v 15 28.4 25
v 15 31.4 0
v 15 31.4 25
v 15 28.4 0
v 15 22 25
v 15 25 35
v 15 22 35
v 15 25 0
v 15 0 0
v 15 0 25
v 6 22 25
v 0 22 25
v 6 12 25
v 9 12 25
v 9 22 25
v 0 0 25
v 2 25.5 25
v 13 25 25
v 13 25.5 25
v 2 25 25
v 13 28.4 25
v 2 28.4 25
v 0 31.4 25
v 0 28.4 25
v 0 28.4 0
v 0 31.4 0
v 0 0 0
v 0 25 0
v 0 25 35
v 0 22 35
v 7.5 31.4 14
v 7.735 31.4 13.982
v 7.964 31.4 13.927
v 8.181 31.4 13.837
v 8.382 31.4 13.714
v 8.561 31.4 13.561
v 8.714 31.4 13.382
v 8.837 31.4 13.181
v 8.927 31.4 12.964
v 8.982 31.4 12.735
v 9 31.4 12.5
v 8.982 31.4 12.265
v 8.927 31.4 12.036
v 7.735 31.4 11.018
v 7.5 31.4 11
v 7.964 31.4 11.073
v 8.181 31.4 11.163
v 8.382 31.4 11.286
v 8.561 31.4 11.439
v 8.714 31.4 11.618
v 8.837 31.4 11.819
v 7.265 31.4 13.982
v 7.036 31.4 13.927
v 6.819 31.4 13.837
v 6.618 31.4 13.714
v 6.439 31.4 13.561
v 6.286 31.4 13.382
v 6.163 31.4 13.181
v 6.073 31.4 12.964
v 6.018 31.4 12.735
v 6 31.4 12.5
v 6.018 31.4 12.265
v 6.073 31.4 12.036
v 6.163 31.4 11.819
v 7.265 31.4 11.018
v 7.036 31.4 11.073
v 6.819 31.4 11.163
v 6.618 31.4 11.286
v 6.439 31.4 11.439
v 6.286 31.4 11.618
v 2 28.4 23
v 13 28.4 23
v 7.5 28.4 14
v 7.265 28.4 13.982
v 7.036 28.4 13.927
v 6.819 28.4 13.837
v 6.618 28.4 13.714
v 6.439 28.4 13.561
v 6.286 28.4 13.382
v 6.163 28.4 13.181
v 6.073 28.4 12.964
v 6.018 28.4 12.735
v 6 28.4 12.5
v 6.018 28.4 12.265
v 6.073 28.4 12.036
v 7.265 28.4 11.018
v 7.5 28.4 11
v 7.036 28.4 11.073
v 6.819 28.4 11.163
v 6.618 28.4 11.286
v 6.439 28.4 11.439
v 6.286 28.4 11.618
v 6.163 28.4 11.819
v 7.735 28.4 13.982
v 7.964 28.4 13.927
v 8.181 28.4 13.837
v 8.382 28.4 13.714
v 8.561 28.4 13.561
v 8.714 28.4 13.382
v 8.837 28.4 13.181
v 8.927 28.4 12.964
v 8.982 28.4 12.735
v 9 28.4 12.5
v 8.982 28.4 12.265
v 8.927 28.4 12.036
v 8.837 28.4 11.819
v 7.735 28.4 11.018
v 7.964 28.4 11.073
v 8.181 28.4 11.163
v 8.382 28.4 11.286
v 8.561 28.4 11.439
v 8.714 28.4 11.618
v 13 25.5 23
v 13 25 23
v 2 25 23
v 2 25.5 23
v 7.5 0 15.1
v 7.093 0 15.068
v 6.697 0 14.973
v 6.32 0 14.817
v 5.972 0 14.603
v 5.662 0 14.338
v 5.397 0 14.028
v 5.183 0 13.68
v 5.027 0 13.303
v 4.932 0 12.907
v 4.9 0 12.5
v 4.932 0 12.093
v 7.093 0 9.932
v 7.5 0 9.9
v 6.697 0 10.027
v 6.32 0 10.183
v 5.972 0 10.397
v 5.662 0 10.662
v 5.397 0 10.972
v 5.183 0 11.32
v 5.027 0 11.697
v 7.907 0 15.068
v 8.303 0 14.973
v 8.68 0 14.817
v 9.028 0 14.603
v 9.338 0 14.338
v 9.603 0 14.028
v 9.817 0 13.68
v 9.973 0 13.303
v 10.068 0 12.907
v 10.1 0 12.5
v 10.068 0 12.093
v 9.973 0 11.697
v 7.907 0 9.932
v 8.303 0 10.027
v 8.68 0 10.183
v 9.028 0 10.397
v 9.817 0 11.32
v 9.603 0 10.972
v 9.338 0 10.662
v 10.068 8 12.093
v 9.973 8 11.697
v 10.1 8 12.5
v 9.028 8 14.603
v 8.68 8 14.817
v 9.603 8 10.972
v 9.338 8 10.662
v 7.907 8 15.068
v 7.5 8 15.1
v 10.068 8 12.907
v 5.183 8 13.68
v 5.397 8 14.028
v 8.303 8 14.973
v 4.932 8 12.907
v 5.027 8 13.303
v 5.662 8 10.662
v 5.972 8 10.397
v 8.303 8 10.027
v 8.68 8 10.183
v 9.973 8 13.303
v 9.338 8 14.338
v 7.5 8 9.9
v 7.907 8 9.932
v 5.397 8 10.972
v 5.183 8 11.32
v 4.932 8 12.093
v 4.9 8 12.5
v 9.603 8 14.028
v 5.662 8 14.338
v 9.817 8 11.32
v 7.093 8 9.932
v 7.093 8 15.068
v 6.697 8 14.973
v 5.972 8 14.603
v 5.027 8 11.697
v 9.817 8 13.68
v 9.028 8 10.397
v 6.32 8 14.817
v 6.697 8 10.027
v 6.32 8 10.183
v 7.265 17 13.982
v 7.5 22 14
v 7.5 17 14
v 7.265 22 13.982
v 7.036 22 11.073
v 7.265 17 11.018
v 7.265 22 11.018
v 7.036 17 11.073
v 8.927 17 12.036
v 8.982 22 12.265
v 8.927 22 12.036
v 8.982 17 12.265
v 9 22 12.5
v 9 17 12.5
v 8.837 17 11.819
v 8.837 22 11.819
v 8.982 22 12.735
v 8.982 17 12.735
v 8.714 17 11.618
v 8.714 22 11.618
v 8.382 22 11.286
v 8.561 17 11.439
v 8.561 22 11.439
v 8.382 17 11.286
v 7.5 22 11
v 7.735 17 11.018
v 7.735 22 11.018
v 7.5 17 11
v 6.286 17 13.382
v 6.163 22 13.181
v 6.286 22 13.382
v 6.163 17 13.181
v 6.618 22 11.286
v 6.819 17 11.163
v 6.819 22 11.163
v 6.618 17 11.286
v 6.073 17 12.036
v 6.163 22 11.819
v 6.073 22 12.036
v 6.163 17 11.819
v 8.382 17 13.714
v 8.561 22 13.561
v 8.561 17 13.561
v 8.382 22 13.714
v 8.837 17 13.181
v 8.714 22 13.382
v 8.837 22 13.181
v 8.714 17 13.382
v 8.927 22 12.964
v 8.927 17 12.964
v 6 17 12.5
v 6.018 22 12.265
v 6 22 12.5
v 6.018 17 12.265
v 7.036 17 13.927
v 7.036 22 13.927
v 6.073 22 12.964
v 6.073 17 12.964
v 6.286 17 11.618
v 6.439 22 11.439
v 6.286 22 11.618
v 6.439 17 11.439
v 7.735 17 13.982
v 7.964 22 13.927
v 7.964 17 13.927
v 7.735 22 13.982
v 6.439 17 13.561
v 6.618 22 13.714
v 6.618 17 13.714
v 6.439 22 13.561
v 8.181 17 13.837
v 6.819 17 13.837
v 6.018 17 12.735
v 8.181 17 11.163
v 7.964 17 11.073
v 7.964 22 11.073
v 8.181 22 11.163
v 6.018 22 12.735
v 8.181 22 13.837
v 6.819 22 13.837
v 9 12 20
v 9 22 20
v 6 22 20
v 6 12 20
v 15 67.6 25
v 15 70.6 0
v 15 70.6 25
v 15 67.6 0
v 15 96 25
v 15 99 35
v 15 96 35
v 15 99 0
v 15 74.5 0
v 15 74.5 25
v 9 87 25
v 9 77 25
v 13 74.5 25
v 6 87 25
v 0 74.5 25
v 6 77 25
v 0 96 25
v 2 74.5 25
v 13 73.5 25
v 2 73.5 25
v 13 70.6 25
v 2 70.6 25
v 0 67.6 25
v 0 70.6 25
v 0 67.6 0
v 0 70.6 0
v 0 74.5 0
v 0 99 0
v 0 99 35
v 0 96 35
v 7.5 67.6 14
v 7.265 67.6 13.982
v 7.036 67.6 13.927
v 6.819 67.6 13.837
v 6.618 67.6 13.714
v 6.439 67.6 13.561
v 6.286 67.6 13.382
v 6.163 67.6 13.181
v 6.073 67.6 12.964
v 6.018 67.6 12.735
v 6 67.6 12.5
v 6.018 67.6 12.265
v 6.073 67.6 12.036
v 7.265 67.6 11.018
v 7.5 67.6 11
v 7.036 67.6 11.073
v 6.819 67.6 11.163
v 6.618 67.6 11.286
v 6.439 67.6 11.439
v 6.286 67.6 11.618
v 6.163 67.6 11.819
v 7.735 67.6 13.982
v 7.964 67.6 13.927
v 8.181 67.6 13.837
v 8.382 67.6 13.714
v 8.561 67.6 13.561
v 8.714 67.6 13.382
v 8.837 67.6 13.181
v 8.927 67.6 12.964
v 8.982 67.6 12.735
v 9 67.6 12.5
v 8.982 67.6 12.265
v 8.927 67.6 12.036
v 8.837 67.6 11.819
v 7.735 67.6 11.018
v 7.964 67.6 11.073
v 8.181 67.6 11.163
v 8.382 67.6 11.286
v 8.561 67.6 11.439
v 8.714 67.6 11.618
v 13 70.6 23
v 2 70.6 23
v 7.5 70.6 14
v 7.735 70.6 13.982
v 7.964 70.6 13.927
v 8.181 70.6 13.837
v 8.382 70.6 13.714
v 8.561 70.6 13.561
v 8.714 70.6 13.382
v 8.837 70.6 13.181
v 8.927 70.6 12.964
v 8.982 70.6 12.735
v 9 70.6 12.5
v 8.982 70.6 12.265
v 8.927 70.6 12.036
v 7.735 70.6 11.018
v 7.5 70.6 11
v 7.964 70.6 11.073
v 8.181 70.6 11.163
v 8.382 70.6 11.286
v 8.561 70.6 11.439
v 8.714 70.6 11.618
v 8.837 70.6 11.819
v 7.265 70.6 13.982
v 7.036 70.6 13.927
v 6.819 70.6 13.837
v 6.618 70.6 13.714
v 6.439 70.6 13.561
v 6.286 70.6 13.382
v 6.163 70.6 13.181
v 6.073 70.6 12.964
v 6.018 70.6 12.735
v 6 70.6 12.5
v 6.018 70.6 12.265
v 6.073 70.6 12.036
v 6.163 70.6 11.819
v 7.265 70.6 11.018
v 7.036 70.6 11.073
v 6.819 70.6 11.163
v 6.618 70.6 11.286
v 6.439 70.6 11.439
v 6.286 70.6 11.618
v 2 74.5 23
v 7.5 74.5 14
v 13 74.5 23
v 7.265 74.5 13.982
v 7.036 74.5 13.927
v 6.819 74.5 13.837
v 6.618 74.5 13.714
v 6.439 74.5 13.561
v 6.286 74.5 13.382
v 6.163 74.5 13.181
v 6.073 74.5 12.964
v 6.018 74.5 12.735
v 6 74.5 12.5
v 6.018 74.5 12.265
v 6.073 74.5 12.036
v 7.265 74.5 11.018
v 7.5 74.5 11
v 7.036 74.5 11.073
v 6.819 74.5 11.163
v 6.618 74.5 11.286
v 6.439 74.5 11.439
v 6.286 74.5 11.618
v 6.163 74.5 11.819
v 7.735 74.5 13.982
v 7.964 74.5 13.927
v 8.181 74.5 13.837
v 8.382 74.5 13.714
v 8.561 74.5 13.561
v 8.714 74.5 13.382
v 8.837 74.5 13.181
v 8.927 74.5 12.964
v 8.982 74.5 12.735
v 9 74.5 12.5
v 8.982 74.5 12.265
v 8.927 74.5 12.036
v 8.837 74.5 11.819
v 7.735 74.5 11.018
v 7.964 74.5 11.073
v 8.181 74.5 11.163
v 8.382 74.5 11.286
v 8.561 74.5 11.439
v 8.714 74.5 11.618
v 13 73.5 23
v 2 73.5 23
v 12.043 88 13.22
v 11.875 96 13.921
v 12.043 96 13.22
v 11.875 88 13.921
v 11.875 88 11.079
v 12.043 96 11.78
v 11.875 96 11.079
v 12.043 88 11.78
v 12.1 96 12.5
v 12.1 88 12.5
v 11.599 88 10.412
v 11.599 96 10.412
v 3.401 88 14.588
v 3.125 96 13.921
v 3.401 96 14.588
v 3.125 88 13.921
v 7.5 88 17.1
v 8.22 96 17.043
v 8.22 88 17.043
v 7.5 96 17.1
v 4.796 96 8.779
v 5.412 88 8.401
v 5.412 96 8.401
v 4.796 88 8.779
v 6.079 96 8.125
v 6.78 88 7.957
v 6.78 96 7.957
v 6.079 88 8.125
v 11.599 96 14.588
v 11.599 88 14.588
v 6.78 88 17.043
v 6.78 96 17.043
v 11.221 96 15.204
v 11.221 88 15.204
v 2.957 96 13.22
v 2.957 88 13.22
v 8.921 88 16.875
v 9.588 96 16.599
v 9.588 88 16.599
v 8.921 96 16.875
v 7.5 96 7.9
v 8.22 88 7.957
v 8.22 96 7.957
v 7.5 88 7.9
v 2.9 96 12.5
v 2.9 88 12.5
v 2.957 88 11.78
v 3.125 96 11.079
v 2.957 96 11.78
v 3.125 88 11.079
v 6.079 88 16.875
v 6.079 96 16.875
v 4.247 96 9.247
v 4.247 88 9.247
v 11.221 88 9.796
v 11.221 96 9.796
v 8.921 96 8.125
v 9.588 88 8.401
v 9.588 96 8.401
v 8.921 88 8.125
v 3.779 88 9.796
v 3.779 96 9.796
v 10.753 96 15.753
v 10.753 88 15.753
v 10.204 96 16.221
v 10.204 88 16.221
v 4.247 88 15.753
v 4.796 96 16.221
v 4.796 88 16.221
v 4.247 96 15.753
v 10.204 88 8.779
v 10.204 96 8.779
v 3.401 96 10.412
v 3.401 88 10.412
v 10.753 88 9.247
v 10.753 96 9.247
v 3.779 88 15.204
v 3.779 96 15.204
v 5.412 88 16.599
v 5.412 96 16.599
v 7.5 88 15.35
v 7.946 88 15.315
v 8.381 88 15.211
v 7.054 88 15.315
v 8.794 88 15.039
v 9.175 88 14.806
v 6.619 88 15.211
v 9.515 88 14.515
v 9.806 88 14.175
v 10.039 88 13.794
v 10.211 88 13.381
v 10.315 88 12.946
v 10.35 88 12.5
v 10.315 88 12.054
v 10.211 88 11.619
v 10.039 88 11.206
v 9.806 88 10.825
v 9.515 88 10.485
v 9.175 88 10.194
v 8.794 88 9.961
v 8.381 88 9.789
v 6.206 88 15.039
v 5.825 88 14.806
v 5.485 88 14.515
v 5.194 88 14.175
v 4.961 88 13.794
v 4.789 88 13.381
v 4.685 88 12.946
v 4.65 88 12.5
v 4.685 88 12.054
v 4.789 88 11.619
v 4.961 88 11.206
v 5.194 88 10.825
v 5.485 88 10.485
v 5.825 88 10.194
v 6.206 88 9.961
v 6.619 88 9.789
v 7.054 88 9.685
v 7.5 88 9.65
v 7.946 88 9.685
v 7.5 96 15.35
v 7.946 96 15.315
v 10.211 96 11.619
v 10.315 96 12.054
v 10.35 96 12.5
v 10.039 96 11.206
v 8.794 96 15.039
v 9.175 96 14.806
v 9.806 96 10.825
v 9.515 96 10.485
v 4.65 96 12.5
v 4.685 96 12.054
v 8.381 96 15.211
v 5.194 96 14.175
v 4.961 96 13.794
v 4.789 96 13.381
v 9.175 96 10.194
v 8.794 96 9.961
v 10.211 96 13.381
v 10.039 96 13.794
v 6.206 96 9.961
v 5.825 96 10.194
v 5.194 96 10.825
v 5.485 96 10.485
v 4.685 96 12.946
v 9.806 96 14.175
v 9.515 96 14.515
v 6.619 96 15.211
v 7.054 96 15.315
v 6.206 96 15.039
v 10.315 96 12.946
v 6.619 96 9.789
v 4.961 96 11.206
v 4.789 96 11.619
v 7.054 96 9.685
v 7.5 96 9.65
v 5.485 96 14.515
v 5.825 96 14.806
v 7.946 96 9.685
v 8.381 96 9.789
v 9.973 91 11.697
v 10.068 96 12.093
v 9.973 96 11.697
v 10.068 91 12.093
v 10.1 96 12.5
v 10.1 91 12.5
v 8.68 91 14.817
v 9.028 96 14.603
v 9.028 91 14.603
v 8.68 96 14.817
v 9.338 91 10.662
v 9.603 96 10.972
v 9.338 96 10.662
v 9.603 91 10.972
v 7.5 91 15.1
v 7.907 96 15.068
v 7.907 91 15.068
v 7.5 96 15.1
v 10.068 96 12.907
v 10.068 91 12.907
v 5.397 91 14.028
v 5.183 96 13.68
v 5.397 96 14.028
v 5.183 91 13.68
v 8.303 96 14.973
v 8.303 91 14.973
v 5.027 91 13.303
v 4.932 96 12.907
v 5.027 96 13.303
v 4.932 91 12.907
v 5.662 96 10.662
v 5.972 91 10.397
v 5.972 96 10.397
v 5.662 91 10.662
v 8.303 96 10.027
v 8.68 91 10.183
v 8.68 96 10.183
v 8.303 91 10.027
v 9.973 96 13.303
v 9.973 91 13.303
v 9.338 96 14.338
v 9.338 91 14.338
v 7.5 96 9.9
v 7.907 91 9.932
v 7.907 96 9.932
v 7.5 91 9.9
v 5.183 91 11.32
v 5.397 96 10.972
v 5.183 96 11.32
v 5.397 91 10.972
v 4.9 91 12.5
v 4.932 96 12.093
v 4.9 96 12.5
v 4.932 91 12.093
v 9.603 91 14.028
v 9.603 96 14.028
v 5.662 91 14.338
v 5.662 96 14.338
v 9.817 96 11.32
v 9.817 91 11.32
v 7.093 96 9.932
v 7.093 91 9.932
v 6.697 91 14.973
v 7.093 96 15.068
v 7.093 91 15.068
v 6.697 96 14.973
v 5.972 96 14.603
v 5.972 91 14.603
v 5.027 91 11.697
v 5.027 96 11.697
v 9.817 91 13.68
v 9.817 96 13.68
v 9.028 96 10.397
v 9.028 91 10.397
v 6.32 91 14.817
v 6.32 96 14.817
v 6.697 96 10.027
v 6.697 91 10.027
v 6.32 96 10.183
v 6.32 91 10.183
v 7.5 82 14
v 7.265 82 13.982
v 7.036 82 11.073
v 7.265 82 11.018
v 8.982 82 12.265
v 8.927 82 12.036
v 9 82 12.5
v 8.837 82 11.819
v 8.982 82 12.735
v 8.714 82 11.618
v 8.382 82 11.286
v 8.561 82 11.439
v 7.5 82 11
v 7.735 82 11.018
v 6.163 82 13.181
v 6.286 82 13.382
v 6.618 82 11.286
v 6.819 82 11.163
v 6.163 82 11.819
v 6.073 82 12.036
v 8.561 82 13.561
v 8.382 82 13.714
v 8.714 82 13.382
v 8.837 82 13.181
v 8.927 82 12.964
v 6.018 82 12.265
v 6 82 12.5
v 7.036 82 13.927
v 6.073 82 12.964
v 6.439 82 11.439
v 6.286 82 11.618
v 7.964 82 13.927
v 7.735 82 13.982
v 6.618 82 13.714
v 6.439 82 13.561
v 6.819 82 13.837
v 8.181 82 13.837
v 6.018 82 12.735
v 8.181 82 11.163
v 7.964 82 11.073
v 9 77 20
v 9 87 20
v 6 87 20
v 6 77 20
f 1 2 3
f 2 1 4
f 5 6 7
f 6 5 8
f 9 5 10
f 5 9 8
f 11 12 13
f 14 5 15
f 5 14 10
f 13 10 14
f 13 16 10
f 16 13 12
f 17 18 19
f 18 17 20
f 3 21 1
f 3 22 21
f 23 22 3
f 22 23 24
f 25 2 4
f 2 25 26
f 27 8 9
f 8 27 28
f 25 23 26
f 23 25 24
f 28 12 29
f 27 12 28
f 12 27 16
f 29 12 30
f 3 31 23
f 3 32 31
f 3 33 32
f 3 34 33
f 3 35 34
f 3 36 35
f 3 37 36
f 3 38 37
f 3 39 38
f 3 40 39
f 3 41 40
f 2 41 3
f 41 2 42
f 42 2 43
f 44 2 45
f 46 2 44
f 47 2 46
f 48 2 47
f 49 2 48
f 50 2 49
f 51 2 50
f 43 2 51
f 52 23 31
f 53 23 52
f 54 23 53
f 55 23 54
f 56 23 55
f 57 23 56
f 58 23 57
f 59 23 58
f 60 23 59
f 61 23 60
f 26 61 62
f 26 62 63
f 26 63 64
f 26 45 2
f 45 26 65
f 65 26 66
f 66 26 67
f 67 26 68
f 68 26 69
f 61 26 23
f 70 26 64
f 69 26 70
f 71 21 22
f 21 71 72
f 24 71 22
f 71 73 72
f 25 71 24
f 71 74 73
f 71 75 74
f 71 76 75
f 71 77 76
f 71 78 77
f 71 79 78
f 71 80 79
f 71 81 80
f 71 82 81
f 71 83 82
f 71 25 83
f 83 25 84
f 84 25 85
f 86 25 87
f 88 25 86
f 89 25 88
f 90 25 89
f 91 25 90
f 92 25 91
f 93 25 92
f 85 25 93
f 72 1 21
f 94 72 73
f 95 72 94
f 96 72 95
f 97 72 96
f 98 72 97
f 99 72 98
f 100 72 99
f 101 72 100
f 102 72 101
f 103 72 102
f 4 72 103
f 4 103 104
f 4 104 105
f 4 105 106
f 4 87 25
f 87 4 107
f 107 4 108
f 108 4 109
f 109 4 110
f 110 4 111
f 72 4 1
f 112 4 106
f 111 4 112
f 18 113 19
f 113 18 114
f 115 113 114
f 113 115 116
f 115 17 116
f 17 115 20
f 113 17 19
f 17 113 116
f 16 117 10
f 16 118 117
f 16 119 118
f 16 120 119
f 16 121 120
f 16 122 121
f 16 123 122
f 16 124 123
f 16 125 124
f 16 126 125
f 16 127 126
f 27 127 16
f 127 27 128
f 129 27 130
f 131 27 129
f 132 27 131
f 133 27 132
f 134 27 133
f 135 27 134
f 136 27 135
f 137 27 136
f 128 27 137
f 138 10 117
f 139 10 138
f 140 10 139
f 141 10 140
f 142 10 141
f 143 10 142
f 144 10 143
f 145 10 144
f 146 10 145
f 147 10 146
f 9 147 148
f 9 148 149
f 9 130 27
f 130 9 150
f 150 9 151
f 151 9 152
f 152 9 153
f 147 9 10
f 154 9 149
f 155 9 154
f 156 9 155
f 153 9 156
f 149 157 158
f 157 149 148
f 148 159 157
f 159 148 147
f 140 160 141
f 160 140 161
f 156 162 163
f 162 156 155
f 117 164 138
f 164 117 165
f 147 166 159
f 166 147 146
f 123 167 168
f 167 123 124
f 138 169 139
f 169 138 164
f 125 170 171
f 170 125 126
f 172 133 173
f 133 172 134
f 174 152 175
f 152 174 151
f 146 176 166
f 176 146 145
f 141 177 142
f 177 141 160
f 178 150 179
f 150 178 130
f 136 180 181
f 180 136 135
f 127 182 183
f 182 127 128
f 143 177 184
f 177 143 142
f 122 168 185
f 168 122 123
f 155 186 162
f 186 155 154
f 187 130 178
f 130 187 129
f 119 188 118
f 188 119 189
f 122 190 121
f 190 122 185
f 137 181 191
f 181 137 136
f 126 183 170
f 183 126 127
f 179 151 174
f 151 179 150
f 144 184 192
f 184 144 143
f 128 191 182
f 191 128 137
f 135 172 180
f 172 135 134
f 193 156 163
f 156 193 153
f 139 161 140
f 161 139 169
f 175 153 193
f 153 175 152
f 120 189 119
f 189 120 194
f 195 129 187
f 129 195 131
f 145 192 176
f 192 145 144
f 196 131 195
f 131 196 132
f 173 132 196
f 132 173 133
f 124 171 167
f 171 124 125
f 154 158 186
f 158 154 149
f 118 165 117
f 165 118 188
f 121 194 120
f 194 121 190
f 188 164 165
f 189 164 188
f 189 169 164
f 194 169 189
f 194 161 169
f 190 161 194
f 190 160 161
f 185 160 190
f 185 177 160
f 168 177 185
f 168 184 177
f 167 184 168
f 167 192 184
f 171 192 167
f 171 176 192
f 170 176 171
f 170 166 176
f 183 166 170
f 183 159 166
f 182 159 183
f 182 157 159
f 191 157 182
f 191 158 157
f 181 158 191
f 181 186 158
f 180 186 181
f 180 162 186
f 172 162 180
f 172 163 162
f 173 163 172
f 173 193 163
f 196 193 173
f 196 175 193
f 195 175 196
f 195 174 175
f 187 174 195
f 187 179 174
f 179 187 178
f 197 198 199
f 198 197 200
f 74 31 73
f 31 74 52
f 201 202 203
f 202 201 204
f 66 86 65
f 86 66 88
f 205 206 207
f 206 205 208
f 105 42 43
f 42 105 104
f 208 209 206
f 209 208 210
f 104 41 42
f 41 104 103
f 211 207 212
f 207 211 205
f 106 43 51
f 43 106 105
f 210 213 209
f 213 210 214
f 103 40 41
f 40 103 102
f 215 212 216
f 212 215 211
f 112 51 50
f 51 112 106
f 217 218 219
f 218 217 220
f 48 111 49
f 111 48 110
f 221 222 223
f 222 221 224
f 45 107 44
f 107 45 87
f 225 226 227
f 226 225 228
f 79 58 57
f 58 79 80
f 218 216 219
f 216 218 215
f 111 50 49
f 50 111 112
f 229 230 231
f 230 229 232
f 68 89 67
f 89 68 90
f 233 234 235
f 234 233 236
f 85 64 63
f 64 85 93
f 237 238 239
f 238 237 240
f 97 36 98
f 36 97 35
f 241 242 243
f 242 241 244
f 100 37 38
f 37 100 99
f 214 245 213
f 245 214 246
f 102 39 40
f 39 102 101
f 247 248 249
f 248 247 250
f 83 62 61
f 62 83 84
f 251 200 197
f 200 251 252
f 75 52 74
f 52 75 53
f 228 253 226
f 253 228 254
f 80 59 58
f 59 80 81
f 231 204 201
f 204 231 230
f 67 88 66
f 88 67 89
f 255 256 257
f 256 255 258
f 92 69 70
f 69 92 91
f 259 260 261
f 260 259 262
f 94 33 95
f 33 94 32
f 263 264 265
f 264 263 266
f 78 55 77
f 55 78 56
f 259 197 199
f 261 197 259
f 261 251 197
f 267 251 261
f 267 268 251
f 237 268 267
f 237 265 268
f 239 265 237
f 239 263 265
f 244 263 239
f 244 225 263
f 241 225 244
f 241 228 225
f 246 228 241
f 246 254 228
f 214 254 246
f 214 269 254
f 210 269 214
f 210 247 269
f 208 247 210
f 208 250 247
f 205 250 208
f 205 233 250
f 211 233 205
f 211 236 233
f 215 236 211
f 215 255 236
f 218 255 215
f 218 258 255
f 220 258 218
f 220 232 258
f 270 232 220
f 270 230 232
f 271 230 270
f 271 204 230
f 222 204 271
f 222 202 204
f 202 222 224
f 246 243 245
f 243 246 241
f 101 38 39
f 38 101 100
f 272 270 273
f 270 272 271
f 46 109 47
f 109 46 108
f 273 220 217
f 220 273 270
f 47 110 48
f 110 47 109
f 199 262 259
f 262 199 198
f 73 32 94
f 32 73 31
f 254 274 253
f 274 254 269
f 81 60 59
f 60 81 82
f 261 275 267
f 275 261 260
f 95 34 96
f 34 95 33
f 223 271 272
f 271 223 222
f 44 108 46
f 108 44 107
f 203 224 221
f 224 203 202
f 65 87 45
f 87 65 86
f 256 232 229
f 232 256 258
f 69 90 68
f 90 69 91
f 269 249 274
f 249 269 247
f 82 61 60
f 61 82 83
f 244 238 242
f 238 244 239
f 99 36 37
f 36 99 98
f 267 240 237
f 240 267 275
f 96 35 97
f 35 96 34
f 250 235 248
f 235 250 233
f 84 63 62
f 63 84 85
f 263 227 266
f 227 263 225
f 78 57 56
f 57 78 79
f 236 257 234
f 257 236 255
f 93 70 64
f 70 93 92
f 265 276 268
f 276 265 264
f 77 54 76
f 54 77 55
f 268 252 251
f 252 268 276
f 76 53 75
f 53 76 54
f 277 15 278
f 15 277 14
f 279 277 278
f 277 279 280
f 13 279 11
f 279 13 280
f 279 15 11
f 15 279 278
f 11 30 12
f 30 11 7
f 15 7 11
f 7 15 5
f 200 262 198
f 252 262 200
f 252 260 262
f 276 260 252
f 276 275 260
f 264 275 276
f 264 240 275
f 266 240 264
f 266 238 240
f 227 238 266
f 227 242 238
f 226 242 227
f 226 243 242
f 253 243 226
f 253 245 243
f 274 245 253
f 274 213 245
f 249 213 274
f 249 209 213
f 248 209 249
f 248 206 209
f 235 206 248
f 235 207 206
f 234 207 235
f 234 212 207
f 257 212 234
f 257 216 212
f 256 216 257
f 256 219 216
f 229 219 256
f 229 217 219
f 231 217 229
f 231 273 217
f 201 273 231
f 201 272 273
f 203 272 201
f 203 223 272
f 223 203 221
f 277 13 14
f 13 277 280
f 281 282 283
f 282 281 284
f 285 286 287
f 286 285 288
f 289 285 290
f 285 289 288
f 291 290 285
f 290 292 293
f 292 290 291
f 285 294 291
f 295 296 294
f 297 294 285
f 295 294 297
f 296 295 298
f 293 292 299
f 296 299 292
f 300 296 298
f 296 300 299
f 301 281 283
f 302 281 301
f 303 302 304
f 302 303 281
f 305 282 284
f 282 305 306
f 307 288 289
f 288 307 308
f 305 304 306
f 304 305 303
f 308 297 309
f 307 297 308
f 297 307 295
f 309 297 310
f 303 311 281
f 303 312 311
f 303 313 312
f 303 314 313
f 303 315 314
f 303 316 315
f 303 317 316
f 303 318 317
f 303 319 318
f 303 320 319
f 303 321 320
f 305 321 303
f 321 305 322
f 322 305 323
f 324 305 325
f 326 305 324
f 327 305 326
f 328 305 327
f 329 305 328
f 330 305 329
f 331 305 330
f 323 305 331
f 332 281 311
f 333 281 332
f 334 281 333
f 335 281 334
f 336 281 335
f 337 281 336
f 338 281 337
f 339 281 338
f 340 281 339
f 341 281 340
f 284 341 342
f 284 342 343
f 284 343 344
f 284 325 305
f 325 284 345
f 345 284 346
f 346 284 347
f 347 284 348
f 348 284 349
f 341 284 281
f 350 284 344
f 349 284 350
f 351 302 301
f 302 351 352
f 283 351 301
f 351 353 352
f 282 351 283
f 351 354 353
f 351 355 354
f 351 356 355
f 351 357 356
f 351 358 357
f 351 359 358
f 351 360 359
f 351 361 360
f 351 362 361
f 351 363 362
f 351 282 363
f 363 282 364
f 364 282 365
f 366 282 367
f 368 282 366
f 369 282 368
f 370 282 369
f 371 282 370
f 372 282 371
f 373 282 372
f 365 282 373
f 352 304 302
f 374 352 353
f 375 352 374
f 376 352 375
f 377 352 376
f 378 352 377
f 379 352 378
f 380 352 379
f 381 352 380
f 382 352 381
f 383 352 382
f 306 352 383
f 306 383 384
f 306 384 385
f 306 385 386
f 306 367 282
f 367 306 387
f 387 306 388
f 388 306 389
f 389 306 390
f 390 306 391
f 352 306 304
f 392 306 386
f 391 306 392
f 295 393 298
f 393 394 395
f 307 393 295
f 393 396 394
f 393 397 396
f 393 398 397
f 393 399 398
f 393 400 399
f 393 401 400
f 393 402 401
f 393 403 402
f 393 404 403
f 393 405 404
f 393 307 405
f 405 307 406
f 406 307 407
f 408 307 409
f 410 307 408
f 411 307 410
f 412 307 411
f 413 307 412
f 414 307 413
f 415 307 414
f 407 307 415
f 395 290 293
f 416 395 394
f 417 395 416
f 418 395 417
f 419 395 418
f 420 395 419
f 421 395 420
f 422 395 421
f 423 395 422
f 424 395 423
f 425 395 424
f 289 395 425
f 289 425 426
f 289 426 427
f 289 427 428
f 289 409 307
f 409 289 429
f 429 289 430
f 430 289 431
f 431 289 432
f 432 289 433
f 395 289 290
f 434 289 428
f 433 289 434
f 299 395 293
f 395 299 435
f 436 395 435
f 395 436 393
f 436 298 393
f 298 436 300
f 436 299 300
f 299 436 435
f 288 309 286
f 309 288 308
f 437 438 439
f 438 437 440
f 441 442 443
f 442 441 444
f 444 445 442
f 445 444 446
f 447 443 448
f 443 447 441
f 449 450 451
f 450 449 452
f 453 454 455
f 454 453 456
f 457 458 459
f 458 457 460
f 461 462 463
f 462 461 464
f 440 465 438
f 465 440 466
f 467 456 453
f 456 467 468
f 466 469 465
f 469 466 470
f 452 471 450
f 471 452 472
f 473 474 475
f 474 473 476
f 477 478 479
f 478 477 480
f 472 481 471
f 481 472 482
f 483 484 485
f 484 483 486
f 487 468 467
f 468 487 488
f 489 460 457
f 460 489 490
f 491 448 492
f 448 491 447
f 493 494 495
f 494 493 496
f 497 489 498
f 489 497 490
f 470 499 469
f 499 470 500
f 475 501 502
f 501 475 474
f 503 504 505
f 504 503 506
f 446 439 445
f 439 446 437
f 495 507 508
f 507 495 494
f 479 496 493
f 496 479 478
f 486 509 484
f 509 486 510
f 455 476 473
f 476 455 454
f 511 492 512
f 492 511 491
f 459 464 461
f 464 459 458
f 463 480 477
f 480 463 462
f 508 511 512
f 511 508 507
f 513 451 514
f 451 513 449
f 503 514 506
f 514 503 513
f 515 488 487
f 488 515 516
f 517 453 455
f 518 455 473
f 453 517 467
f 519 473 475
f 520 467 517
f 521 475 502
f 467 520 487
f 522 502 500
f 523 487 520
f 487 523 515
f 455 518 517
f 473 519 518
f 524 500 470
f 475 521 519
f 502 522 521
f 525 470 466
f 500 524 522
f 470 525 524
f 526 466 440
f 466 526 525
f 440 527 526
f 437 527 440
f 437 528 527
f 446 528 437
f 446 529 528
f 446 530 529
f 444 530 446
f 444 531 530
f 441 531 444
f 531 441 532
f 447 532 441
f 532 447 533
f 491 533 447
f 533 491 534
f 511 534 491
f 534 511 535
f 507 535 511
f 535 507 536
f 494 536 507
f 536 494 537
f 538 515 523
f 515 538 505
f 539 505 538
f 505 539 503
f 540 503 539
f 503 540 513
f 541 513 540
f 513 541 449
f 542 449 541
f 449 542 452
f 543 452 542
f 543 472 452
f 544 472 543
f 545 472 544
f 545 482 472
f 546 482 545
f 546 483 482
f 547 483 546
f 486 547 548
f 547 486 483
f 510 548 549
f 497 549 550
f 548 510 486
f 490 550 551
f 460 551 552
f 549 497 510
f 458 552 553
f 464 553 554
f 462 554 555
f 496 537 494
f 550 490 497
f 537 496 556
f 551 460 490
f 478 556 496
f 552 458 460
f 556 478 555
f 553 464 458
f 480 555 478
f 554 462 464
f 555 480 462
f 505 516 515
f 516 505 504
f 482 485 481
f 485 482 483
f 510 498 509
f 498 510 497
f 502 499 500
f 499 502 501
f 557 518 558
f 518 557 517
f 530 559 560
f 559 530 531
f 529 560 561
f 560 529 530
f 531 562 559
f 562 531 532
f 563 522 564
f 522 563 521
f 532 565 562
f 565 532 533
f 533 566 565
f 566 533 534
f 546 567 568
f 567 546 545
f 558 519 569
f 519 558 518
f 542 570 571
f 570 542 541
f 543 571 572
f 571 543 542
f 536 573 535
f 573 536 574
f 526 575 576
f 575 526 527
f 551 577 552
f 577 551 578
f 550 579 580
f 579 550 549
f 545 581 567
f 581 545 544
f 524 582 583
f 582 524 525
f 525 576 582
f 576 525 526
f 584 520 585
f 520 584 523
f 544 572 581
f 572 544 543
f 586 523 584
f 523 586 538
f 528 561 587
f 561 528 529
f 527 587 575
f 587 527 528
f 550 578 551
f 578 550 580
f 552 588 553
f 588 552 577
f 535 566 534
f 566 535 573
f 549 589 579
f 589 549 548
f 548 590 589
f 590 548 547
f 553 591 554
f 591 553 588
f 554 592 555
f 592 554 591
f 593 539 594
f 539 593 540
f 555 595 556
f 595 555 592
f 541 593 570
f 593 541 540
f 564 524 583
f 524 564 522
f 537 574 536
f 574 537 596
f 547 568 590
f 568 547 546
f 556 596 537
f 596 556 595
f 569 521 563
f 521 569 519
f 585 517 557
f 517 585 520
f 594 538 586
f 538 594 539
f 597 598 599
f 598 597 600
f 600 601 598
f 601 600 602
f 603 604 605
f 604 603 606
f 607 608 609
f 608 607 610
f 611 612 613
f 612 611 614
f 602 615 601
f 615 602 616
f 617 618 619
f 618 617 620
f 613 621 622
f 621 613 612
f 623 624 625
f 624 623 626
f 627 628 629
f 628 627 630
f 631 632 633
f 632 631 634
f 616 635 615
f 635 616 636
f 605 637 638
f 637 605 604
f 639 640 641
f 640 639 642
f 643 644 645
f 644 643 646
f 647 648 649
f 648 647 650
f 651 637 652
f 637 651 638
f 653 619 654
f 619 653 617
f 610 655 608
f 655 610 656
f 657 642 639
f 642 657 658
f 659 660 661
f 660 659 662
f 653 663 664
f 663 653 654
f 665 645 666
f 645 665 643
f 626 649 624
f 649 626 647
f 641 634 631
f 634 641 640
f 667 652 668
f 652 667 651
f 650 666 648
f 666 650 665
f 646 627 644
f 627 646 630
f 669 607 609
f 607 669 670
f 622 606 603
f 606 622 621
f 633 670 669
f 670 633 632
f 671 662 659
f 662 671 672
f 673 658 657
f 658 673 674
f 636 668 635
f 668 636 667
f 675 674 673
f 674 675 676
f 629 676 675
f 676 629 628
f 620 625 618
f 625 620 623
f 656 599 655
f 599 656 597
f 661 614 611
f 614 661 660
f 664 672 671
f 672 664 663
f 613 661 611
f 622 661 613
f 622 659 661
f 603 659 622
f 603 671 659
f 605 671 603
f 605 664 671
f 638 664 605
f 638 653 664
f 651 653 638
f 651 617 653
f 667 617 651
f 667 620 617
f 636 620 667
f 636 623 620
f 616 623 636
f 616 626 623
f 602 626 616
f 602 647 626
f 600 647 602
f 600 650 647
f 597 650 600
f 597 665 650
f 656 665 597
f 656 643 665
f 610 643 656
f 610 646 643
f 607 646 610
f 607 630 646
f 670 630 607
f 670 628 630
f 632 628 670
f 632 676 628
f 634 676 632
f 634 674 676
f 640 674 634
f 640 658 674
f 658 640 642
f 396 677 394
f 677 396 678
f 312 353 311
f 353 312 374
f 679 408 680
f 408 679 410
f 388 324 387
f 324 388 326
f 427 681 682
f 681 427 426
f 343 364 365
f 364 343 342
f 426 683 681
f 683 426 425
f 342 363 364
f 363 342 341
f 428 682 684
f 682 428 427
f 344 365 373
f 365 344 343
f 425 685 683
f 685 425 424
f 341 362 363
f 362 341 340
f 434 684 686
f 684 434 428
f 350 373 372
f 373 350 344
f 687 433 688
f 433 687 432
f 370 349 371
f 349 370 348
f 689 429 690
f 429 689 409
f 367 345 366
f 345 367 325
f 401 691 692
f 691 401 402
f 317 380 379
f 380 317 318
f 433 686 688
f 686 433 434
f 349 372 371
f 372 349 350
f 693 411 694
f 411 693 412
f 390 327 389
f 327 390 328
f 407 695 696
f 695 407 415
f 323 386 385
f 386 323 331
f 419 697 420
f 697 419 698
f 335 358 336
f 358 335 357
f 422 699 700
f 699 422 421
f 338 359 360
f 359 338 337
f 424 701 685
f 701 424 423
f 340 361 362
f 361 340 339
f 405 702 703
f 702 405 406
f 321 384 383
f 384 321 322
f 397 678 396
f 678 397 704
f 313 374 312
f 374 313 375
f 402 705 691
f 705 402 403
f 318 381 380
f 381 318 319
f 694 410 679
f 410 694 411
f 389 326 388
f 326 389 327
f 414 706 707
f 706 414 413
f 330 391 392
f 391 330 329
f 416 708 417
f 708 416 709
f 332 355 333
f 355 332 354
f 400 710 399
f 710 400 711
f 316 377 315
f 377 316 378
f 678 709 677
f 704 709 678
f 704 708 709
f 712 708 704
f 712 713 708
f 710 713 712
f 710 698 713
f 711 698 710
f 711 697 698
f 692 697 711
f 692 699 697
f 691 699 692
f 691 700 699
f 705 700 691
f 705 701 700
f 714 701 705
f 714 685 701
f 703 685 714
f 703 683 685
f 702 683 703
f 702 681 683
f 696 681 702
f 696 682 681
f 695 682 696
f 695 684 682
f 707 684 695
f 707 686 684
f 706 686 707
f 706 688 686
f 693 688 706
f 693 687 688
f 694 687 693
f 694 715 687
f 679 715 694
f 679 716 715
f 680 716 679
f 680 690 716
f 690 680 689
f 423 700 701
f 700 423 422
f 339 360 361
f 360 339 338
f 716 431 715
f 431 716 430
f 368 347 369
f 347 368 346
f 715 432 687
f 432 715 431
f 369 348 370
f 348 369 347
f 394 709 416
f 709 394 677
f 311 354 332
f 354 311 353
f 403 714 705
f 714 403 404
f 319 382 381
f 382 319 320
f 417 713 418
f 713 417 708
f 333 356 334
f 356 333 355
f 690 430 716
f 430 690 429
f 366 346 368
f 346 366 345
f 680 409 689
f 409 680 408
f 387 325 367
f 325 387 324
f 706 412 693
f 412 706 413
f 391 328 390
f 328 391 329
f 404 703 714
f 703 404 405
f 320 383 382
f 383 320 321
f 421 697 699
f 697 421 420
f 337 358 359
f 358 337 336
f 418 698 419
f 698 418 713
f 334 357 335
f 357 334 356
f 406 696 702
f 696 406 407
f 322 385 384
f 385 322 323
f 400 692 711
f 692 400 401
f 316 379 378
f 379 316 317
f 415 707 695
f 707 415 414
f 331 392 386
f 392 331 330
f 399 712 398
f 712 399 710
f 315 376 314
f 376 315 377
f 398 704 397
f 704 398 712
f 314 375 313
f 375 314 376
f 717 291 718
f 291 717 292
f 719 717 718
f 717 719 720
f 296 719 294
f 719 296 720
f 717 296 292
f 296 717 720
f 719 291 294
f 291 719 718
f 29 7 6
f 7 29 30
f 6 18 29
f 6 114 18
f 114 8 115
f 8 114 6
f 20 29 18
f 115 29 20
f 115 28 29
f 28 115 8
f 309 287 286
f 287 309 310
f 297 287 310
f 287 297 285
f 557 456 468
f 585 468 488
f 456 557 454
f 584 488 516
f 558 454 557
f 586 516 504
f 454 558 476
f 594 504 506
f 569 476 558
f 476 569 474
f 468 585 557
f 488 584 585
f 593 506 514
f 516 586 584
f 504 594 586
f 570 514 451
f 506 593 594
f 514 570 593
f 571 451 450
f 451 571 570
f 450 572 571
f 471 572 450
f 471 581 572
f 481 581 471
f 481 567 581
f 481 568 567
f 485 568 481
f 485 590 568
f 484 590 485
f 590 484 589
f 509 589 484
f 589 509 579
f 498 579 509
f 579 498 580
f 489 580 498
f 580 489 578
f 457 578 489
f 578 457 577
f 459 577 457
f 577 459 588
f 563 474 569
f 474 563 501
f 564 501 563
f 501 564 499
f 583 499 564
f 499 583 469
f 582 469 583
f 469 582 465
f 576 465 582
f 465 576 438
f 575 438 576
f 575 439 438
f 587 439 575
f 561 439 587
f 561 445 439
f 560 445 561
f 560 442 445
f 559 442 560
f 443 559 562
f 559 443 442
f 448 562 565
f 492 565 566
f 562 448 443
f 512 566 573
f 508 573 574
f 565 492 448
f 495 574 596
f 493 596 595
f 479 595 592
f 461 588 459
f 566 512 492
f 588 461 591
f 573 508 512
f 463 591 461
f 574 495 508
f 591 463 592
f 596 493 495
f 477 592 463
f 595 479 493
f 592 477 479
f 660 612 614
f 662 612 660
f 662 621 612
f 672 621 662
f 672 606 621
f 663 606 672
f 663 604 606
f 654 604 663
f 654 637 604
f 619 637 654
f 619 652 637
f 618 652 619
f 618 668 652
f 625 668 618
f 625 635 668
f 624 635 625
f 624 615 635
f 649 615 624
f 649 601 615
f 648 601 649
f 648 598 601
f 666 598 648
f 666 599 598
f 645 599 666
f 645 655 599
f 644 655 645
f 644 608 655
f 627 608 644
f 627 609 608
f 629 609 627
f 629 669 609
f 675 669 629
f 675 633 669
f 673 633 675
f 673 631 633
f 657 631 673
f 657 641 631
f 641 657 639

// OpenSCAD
// file: common.scad
// ============================================================
// FBA Prep Machine - Common Parameters
// All dimensions in millimeters
// ============================================================

// --- Texjoy Bottle Dimensions (16oz) ---
BOTTLE_WIDTH   = 65;    // X dimension (front-to-back)
BOTTLE_DEPTH   = 65;    // Y dimension (side-to-side)
BOTTLE_HEIGHT  = 170;   // Z dimension (cap to base)
BOTTLE_CLEARANCE = 3;   // Extra gap per side for easy sliding

// Derived chute dimensions
CHUTE_WIDTH    = BOTTLE_WIDTH + BOTTLE_CLEARANCE * 2;   // 71mm
CHUTE_DEPTH    = BOTTLE_DEPTH + BOTTLE_CLEARANCE * 2;   // 71mm
CHUTE_WALL     = 3;     // Wall thickness
CHUTE_HEIGHT   = 50;    // Wall height (doesn't need to be full bottle height)

// --- Hardware Dimensions ---
// NEMA 17 Stepper Motor
NEMA17_SIZE     = 42.3;
NEMA17_HOLE_SPACING = 31;
NEMA17_SHAFT_DIA    = 5;
NEMA17_BOSS_DIA     = 22;
NEMA17_SCREW_DIA    = 3.2;  // M3 clearance

// A4988 Stepper Driver
A4988_WIDTH  = 20.5;
A4988_LENGTH = 15.5;

// ESP32 DevKit V1
ESP32_WIDTH  = 28;
ESP32_LENGTH = 52;
ESP32_HEIGHT = 8;

// GM65 Barcode Scanner Module
GM65_WIDTH   = 20.5;
GM65_LENGTH  = 34;
GM65_HEIGHT  = 18;

// IR LED / Photodiode (5mm)
IR_LED_DIA   = 5.2;

// Servo (SG90/MG90S)
SERVO_WIDTH  = 12.5;
SERVO_LENGTH = 23;
SERVO_HEIGHT = 22;
SERVO_TAB_WIDTH = 32.5;
SERVO_SCREW_SPACING = 28;

// Nichrome Wire
NICHROME_DIA = 1.0;

// --- Fastener Dimensions ---
M3_DIA       = 3.2;
M3_HEAD_DIA  = 5.8;
M3_NUT_W     = 5.5;
M3_NUT_H     = 2.4;

M4_DIA       = 4.2;
M4_HEAD_DIA  = 7.2;

// --- Snap-Fit Parameters ---
SNAP_WIDTH     = 8;
SNAP_HEIGHT    = 4;
SNAP_DEPTH     = 2;
SNAP_TOLERANCE = 0.3;

// --- Print Settings ---
LAYER_HEIGHT  = 0.2;
NOZZLE_DIA    = 0.4;
$fn = 40;  // Circle resolution

// --- Helper Modules ---

// Rounded rectangle
module rounded_rect(w, d, h, r=2) {
    hull() {
        for (x = [r, w-r])
            for (y = [r, d-r])
                translate([x, y, 0])
                    cylinder(h=h, r=r);
    }
}

// M3 screw hole (through)
module m3_hole(h=10) {
    cylinder(d=M3_DIA, h=h);
}

// M3 counterbore
module m3_counterbore(h=10, cb_depth=3) {
    cylinder(d=M3_DIA, h=h);
    cylinder(d=M3_HEAD_DIA, h=cb_depth);
}

// M3 nut trap (hexagonal)
module m3_nut_trap(h=M3_NUT_H) {
    cylinder(d=M3_NUT_W / cos(30), h=h, $fn=6);
}

// Snap-fit tab (male)
module snap_tab() {
    // Tapered tab for snap-fit connection
    hull() {
        cube([SNAP_WIDTH, SNAP_DEPTH * 0.5, SNAP_HEIGHT]);
        translate([0, SNAP_DEPTH, SNAP_HEIGHT * 0.3])
            cube([SNAP_WIDTH, 0.1, SNAP_HEIGHT * 0.4]);
    }
}

// Snap-fit slot (female)
module snap_slot() {
    cube([SNAP_WIDTH + SNAP_TOLERANCE*2,
          SNAP_DEPTH + SNAP_TOLERANCE,
          SNAP_HEIGHT + SNAP_TOLERANCE*2]);
}
// main file
// ============================================================
// FBA Prep Machine - Sensor Brackets
// IR break-beam sensor mount (bottle counter)
// Clips onto bottle chute walls
// Print: 0.2mm layers, 3 walls, 30% infill, PLA
// ============================================================

use <common.scad>
include <common.scad>

// --- IR Sensor Parameters ---
IR_SENSOR_DIA  = IR_LED_DIA;   // 5.2mm
IR_DEPTH       = 8;            // How deep the LED/photodiode sit
BRACKET_WALL   = 3;
BRACKET_HEIGHT = 25;

// Clip dimensions (clips onto chute wall)
CLIP_WIDTH     = 15;
CLIP_GAP       = CHUTE_WALL + 0.4;  // Chute wall + tolerance
CLIP_DEPTH     = 12;
CLIP_LIP       = 2;

// --- IR Emitter Bracket (one side of chute) ---
module ir_emitter_bracket() {
    difference() {
        union() {
            // Main body
            cube([CLIP_WIDTH, CLIP_DEPTH + 10, BRACKET_HEIGHT]);

            // Chute wall clip
            translate([0, CLIP_DEPTH + 10, 0])
                chute_clip();
        }

        // LED hole
        translate([CLIP_WIDTH/2, -1, BRACKET_HEIGHT/2])
            rotate([-90, 0, 0])
                cylinder(d=IR_SENSOR_DIA, h=IR_DEPTH + 1);

        // Wire channel (back)
        translate([CLIP_WIDTH/2, CLIP_DEPTH + 5, BRACKET_HEIGHT/2])
            rotate([-90, 0, 0])
                cylinder(d=3, h=15);

        // Wire exit hole (top)
        translate([CLIP_WIDTH/2 - 1.5, CLIP_DEPTH, BRACKET_HEIGHT - 5])
            cube([3, 10, 6]);
    }
}

// --- IR Receiver Bracket (other side of chute) ---
module ir_receiver_bracket() {
    difference() {
        union() {
            // Main body
            cube([CLIP_WIDTH, CLIP_DEPTH + 10, BRACKET_HEIGHT]);

            // Chute wall clip
            translate([0, CLIP_DEPTH + 10, 0])
                chute_clip();
        }

        // Photodiode hole
        translate([CLIP_WIDTH/2, -1, BRACKET_HEIGHT/2])
            rotate([-90, 0, 0])
                cylinder(d=IR_SENSOR_DIA, h=IR_DEPTH + 1);

        // Ambient light shield (tube around sensor)
        translate([CLIP_WIDTH/2, 0, BRACKET_HEIGHT/2])
            rotate([-90, 0, 0])
                difference() {
                    cylinder(d=IR_SENSOR_DIA + 4, h=IR_DEPTH + 3);
                    cylinder(d=IR_SENSOR_DIA + 0.5, h=IR_DEPTH + 4);
                }

        // Wire channel
        translate([CLIP_WIDTH/2, CLIP_DEPTH + 5, BRACKET_HEIGHT/2])
            rotate([-90, 0, 0])
                cylinder(d=3, h=15);

        // Wire exit hole (top)
        translate([CLIP_WIDTH/2 - 1.5, CLIP_DEPTH, BRACKET_HEIGHT - 5])
            cube([3, 10, 6]);
    }
}

// --- Chute Wall Clip ---
module chute_clip() {
    // C-shaped clip that snaps over chute wall
    difference() {
        cube([CLIP_WIDTH, CLIP_GAP + BRACKET_WALL * 2, BRACKET_HEIGHT]);

        // Channel for chute wall
        translate([-1, BRACKET_WALL, -1])
            cube([CLIP_WIDTH + 2, CLIP_GAP, BRACKET_HEIGHT + 2]);

        // Entry relief (slight taper for snap-on)
        translate([-1, BRACKET_WALL - 0.5, -1])
            cube([CLIP_WIDTH + 2, 1, BRACKET_HEIGHT + 2]);
    }

    // Retention lips (snap over wall top)
    translate([2, BRACKET_WALL - CLIP_LIP, BRACKET_HEIGHT - 2])
        cube([CLIP_WIDTH - 4, CLIP_LIP + 0.5, 2]);
    translate([2, BRACKET_WALL + CLIP_GAP, BRACKET_HEIGHT - 2])
        cube([CLIP_WIDTH - 4, CLIP_LIP + 0.5, 2]);
}

// --- Adjustable Height Bracket ---
// For fine-tuning sensor alignment
module adjustable_bracket() {
    slot_length = 15;

    difference() {
        union() {
            // Base with vertical slot
            cube([CLIP_WIDTH, 8, BRACKET_HEIGHT + slot_length]);

            // Sensor holder (slides in slot)
            translate([0, 0, BRACKET_HEIGHT])
                cube([CLIP_WIDTH, CLIP_DEPTH + 10, 15]);
        }

        // Vertical adjustment slot
        translate([CLIP_WIDTH/2, -1, BRACKET_HEIGHT - 5])
            hull() {
                rotate([-90, 0, 0])
                    cylinder(d=M3_DIA, h=10);
                translate([0, 0, slot_length])
                    rotate([-90, 0, 0])
                        cylinder(d=M3_DIA, h=10);
            }

        // LED/photodiode hole
        translate([CLIP_WIDTH/2, -1, BRACKET_HEIGHT + 7.5])
            rotate([-90, 0, 0])
                cylinder(d=IR_SENSOR_DIA, h=CLIP_DEPTH + 12);
    }
}

// --- Dual Sensor Bracket (entry + exit count) ---
module dual_sensor_bracket() {
    spacing = 30;  // Distance between two sensors

    // Entry sensor
    ir_emitter_bracket();

    // Exit sensor (offset along chute)
    translate([0, 0, spacing])
        ir_emitter_bracket();

    // Connecting bar
    translate([0, CLIP_DEPTH + 8, 0])
        cube([CLIP_WIDTH, 3, BRACKET_HEIGHT + spacing]);
}

// --- Assembly View ---
module sensor_assembly() {
    // Show a pair facing each other across the chute
    chute_gap = CHUTE_DEPTH + CHUTE_WALL * 2;

    // Emitter side
    color("Red")
        ir_emitter_bracket();

    // Receiver side (mirrored across chute)
    color("DarkRed")
        translate([0, chute_gap + CLIP_DEPTH + 10, 0])
            mirror([0, 1, 0])
                ir_receiver_bracket();

    // Chute wall preview
    color("Gray", 0.2) {
        translate([0, CLIP_DEPTH + 10, 0])
            cube([CLIP_WIDTH, CHUTE_WALL, BRACKET_HEIGHT + 10]);
        translate([0, CLIP_DEPTH + 10 + CHUTE_DEPTH + CHUTE_WALL, 0])
            cube([CLIP_WIDTH, CHUTE_WALL, BRACKET_HEIGHT + 10]);
    }
}

// --- Render ---
sensor_assembly();

// Individual parts (uncomment one):
// ir_emitter_bracket();
// ir_receiver_bracket();
// adjustable_bracket();
// dual_sensor_bracket();
